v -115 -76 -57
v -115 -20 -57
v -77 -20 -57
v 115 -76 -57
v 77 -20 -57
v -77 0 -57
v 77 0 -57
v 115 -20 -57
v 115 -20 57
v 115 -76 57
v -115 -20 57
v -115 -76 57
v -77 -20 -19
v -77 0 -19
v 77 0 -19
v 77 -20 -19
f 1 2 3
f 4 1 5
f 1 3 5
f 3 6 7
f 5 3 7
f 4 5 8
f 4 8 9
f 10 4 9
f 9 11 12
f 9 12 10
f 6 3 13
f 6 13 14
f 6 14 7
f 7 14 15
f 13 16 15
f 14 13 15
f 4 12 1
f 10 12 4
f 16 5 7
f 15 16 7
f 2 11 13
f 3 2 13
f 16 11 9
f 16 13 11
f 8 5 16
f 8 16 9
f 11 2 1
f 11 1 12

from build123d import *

# Parameters (mm, degrees)
F0_W     = 230
F0_H     = 114
F1_DEPTH = 76
F3_W     = 20
F3_H     = 76
F4_DEPTH = 230.001
F6_W     = 38
F6_H     = 20
F7_DEPTH = 114.001


with BuildPart() as f1:
    # F0 (on Front) → F1 (new body)
    with BuildSketch(Plane.XZ):
        Rectangle(F0_W, F0_H)
    extrude(amount=F1_DEPTH)

    # F3 (on offset) → F4 (cut, through all)
    with BuildSketch(Plane.YZ.offset(115)):
        with Locations((-10, 19)):
            Rectangle(F3_W, F3_H)
    extrude(amount=-F4_DEPTH, mode=Mode.SUBTRACT)

    # F6 (on offset) → F7 (cut, through all)
    with BuildSketch(Plane.XY.offset(-57)):
        with Locations((-96, -10)):
            Rectangle(F6_W, F6_H)
        with Locations((96, -10)):
            Rectangle(F6_W, F6_H)
    extrude(amount=F7_DEPTH, mode=Mode.SUBTRACT)


solid = f1.part
